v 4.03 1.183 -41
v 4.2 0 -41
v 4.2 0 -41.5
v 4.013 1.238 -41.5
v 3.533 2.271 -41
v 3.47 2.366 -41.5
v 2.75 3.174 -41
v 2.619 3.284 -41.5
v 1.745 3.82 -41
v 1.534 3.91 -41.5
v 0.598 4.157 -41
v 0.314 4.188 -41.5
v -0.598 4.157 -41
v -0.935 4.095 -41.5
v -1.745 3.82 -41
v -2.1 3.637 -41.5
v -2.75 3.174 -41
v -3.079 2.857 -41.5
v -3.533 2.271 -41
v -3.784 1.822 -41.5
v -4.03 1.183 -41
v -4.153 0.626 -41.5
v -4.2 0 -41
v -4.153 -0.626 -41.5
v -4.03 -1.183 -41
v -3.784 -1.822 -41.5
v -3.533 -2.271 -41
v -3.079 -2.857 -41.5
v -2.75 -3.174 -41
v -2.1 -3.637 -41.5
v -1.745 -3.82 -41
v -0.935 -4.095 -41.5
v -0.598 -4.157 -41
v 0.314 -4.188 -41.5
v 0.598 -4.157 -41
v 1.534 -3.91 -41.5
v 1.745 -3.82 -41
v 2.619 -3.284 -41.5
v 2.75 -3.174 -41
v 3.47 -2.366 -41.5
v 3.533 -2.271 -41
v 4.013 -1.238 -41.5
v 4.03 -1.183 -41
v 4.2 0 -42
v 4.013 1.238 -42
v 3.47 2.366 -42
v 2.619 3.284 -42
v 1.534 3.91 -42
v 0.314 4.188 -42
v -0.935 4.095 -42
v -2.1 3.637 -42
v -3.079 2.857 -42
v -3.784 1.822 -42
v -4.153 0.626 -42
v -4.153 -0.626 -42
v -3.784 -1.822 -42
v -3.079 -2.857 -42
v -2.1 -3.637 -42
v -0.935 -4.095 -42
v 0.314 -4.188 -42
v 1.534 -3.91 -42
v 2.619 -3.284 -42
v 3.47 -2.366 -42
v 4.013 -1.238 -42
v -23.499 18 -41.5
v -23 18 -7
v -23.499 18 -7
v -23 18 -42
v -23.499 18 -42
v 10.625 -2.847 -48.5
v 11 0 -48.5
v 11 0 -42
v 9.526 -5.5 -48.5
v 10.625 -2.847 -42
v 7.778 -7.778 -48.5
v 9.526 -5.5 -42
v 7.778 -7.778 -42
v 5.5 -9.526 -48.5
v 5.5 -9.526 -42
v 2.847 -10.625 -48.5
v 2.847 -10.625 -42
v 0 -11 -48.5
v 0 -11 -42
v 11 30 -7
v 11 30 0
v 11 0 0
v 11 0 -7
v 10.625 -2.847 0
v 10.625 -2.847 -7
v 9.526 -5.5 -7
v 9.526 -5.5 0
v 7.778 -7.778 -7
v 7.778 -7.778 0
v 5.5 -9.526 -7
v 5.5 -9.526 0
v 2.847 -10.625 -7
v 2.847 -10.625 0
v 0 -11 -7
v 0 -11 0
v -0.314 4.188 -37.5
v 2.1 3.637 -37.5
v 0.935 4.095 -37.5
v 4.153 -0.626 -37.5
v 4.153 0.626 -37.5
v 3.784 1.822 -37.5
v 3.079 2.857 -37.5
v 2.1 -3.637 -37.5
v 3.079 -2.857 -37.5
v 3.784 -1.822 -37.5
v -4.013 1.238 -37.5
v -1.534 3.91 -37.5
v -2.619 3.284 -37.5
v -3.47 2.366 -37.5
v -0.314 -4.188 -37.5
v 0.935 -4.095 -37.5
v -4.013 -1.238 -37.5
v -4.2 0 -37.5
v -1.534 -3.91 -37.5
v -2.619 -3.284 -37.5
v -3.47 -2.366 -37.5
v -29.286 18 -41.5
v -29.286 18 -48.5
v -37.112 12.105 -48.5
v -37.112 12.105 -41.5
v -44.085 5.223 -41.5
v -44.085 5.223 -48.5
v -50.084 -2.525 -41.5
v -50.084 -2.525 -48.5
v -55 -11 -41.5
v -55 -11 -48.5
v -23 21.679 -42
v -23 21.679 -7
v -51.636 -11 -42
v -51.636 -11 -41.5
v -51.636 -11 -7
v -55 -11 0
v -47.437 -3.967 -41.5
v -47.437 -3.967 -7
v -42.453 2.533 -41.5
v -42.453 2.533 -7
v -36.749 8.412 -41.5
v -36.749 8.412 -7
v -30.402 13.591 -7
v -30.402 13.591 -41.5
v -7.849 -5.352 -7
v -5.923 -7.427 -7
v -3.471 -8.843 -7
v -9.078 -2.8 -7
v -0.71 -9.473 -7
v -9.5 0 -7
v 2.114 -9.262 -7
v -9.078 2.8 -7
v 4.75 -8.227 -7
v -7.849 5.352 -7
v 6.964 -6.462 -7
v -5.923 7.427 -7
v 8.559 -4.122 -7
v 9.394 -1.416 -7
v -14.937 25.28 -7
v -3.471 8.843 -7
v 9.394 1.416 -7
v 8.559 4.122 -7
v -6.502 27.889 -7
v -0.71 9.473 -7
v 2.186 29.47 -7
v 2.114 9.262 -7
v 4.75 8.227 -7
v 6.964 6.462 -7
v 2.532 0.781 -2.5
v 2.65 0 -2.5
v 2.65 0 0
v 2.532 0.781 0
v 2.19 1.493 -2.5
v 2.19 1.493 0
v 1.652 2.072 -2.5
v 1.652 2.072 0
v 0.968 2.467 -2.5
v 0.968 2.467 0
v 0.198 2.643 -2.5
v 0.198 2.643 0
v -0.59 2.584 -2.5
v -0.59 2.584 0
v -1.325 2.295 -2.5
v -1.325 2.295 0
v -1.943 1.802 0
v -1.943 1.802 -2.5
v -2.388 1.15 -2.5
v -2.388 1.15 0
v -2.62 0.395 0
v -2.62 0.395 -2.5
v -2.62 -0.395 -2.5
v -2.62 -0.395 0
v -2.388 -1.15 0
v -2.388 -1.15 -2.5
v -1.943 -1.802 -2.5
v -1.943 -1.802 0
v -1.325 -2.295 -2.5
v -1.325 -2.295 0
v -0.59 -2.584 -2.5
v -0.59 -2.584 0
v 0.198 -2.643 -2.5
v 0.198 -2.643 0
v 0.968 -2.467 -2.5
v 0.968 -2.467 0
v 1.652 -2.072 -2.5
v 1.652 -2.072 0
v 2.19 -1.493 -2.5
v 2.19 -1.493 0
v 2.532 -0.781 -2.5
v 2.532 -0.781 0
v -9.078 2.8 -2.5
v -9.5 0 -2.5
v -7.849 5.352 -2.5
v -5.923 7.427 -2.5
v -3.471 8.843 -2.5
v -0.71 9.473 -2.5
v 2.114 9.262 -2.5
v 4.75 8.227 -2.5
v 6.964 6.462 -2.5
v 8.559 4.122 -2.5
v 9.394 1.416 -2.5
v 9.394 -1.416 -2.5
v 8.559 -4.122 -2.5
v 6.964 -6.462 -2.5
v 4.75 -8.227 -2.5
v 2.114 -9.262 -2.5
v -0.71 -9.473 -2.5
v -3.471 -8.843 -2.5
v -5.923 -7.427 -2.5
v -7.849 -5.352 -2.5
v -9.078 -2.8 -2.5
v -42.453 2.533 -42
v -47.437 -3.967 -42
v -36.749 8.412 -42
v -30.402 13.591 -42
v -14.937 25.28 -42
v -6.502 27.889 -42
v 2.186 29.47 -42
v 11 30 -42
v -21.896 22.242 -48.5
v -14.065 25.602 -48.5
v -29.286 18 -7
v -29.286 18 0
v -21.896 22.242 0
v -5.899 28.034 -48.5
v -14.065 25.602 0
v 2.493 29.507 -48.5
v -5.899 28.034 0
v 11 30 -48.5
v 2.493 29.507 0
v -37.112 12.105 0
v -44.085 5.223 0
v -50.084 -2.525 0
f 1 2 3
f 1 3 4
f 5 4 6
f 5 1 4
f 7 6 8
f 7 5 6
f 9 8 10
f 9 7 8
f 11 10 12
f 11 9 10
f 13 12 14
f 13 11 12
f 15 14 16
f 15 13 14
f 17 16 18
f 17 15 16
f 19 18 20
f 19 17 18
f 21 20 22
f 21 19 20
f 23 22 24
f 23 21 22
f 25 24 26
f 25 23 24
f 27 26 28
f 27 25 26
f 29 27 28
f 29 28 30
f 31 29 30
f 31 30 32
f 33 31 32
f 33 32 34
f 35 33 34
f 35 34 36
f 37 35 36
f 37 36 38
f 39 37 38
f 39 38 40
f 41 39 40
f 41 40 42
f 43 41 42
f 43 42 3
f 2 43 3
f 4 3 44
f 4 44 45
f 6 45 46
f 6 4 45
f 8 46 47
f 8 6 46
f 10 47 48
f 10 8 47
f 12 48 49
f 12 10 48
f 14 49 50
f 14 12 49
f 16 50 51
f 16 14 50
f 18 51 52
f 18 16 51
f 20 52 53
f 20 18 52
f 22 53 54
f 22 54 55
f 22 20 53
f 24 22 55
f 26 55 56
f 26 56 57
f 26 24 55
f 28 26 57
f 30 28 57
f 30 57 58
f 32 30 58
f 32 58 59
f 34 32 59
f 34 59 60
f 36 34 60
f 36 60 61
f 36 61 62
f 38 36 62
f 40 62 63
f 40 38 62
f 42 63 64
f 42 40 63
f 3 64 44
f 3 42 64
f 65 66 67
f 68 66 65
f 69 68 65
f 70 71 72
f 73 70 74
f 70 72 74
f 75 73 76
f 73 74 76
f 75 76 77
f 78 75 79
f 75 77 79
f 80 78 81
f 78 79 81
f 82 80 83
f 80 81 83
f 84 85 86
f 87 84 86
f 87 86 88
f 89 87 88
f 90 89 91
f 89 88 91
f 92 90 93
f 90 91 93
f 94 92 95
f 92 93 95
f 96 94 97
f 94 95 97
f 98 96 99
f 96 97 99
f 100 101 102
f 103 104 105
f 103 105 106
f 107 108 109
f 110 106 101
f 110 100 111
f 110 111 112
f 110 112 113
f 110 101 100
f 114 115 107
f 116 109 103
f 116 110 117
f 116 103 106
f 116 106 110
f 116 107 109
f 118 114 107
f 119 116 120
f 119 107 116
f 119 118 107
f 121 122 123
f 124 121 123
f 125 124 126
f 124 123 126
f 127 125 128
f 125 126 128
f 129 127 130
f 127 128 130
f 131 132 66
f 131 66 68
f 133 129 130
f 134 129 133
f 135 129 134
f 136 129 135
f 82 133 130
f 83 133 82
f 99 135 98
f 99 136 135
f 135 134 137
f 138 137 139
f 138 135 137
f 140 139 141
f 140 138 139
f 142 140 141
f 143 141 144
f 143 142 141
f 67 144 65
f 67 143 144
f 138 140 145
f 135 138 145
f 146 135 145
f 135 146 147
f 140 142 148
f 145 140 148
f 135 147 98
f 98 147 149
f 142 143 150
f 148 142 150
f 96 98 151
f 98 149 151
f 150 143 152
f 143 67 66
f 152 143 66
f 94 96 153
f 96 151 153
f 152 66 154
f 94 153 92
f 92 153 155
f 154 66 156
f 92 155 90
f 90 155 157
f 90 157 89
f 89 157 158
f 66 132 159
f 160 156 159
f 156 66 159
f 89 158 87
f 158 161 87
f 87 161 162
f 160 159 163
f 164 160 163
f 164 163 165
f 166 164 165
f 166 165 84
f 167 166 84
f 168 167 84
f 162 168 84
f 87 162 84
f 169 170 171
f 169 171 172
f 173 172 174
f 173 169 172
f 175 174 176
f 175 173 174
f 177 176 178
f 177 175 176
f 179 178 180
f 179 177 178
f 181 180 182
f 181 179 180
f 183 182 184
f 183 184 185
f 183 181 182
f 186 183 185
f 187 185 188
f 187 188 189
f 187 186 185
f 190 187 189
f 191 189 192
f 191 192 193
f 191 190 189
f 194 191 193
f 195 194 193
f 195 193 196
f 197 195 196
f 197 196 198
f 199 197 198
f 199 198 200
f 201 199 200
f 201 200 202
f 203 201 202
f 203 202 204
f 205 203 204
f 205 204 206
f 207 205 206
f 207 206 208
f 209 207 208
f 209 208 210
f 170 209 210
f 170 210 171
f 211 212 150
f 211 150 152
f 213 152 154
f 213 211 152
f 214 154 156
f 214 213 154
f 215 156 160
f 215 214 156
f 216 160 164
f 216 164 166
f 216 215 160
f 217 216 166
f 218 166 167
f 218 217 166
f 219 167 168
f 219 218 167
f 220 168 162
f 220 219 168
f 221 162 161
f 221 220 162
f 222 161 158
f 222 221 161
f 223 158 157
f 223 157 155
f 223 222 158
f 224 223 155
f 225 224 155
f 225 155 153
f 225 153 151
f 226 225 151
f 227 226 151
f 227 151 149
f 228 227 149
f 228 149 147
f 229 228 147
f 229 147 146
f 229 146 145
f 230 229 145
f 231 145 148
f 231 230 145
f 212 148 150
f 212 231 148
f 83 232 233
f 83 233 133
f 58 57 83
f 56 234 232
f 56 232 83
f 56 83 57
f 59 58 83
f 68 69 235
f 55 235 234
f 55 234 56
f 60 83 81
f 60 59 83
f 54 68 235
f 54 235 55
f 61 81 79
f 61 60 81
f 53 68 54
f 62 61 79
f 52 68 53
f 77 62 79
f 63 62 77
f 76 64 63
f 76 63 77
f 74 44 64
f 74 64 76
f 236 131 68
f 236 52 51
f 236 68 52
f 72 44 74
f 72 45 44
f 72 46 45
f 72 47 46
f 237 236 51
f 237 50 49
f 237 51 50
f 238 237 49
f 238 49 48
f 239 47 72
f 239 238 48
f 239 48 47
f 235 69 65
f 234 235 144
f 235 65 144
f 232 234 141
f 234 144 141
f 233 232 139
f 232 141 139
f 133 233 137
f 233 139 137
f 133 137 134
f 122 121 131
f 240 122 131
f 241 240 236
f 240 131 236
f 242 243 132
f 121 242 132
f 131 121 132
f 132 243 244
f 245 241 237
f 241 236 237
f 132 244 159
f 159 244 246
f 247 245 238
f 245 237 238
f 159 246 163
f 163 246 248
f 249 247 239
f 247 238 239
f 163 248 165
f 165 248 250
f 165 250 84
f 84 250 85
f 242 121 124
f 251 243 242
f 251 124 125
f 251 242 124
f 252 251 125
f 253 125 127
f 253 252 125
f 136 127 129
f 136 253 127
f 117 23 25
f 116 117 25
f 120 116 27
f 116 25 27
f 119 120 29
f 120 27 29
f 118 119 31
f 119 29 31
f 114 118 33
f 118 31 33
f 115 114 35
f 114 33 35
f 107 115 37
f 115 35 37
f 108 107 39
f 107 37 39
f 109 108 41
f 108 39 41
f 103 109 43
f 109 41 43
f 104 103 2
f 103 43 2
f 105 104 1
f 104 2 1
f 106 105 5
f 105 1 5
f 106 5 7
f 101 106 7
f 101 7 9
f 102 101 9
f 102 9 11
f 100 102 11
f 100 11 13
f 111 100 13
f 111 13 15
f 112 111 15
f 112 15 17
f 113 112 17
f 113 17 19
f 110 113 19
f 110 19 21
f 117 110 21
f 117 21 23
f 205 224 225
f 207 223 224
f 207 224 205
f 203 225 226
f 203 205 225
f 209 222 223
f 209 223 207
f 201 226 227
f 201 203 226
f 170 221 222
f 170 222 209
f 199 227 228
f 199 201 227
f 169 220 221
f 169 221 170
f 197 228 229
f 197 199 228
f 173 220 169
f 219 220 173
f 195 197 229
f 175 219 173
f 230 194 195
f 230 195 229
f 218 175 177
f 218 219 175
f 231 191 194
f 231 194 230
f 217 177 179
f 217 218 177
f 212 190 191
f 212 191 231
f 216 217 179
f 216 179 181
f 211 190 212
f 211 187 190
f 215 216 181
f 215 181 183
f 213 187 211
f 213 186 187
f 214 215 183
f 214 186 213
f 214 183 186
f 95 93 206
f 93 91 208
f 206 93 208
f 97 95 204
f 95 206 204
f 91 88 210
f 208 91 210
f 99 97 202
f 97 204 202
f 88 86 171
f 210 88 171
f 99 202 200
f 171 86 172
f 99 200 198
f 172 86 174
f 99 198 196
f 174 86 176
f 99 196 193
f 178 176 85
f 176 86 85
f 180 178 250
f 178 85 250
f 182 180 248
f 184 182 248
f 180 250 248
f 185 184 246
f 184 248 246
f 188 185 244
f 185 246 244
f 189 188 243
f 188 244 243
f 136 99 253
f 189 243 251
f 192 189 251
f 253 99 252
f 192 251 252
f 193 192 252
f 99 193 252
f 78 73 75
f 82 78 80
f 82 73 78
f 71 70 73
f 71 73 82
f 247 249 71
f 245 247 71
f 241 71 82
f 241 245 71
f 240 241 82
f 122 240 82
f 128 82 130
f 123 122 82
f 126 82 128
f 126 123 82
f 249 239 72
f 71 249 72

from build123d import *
from build123d.topology import SkipClean

# Parameters (mm, degrees)
SKETCH1_R              = 9.5
BOSS_EXTRUDE1_DEPTH    = 48
SKETCH2_W              = 34
SKETCH2_H              = 30
CUT_EXTRUDE1_DEPTH     = 62.481704596
BOSS_EXTRUDE2_START    = -2.5
SKETCH3_R              = 9.5
SKETCH3_R_2            = 2.4
BOSS_EXTRUDE2_DEPTH    = 2.5
SKETCH4_R              = 9.5
SKETCH4_R_2            = 4.2
BOSS_EXTRUDE3_DEPTH    = 7
SKETCH5_R              = 4.2
BOSS_EXTRUDE4_DEPTH    = 11
BOSS_EXTRUDE5_DEPTH    = 48
CUT_EXTRUDE2_START     = -48
CUT_EXTRUDE2_OUTLINE_R = 2.65
CUT_EXTRUDE2_DEPTH     = 48
CUT_EXTRUDE3_START     = -4.5
SKETCH8_R              = 9.5
CUT_EXTRUDE3_DEPTH     = 4.5
SKETCH9_R              = 6.067807638
CUT_EXTRUDE4_DEPTH     = 4.5
SKETCH10_R             = 9.5
BOSS_EXTRUDE6_DEPTH    = 4.5
SKETCH11_R             = 4.2
BOSS_EXTRUDE7_DEPTH    = 3.5
SKETCH12_R             = 2.4
BOSS_EXTRUDE8_DEPTH    = 2.5
SKETCH13_W             = 35
SKETCH13_H             = 34
CUT_EXTRUDE5_DEPTH     = 14.5
SKETCH15_R             = 3.436413098
BOSS_EXTRUDE9_DEPTH    = 10
BOSS_EXTRUDE10_DEPTH   = 0.5
SKETCH18_R             = 4.2
CUT_EXTRUDE8_DEPTH     = 0.5
CUT_EXTRUDE9_DEPTH     = 69.529190861
BOSS_EXTRUDE11_DEPTH   = 7
CUT_EXTRUDE10_DEPTH    = 80.22909819
BOSS_EXTRUDE12_DEPTH   = 41.5
SKETCH25_R             = 4.2
CUT_EXTRUDE11_DEPTH    = 0.5


# Read off the part's stored shape, not the designer's step: Cut-Extrude2
with BuildPart() as part:
    # Sketch1 → Boss-Extrude1 (new body)
    with BuildSketch(Plane.XY):
        with BuildLine():
            Line((-12, 0), (-12, 30))
            Line((-12, 30), (12, 30))
            Line((12, 30), (12, 0))
            ThreePointArc((12, 0), (0, -12), (-12, 0))
        make_face()
        Circle(SKETCH1_R, mode=Mode.SUBTRACT)
    extrude(amount=-BOSS_EXTRUDE1_DEPTH)

    # Sketch2 → Cut-Extrude1 (cut, through all)
    with BuildSketch(Plane.ZY.offset(12)):
        with Locations((-24, 3)):
            Rectangle(SKETCH2_W, SKETCH2_H)
    extrude(amount=-CUT_EXTRUDE1_DEPTH, mode=Mode.SUBTRACT)

    # Sketch3 → Boss-Extrude2 (add)
    with BuildSketch(Plane(origin=(0, 0, -48), x_dir=(-1, 0, 0), z_dir=(0, 0, -1)).offset(BOSS_EXTRUDE2_START)):
        Circle(SKETCH3_R)
        Circle(SKETCH3_R_2, mode=Mode.SUBTRACT)
    extrude(amount=BOSS_EXTRUDE2_DEPTH)

    # Sketch4 → Boss-Extrude3 (add)
    with BuildSketch(Plane.XY):
        with Locations(Location((0, 0, 0), (0, 0, 180))):
            Circle(SKETCH4_R)
        Circle(SKETCH4_R_2, mode=Mode.SUBTRACT)
    extrude(amount=-BOSS_EXTRUDE3_DEPTH)

    # Sketch5 → Boss-Extrude4 (add)
    with BuildSketch(Plane.XY):
        Circle(SKETCH5_R)
    extrude(amount=-BOSS_EXTRUDE4_DEPTH)

    # Sketch6 → Boss-Extrude5 (add)
    with BuildSketch(Plane(origin=(0, 0, -48), x_dir=(-1, 0, 0), z_dir=(0, 0, -1))):
        Polygon((12, 30), (12, 18), (18, 18), (38, 18), (38, 30), align=None)
    extrude(amount=-BOSS_EXTRUDE5_DEPTH)

    # Cut-Extrude2 outline → Cut-Extrude2 (cut)
    with BuildSketch(Plane.XY.offset(CUT_EXTRUDE2_START)):
        Circle(CUT_EXTRUDE2_OUTLINE_R)
    extrude(amount=CUT_EXTRUDE2_DEPTH, mode=Mode.SUBTRACT)

    # Sketch8 → Cut-Extrude3 (cut)
    with BuildSketch(Plane(origin=(0, 0, -7), x_dir=(-1, 0, 0), z_dir=(0, 0, -1)).offset(CUT_EXTRUDE3_START)):
        Circle(SKETCH8_R)
    extrude(amount=CUT_EXTRUDE3_DEPTH, mode=Mode.SUBTRACT)


with BuildPart() as cut_extrude3_piece_1:
    # of the separate pieces the step leaves, piece 1, a body of its own (cut_extrude3_pieces)
    add(part.part.solids().sort_by_distance((-12, 0, 0))[0])

    # Sketch10 → Boss-Extrude6 (add)
    with BuildSketch(Plane.XY.offset(-45.5)):
        with Locations(Location((0, 0, 0), (0, 0, 90))):
            Circle(SKETCH10_R)
    extrude(amount=BOSS_EXTRUDE6_DEPTH)

    # Sketch11 → Boss-Extrude7 (add)
    with BuildSketch(Plane.XY.offset(-41)):
        with Locations(Location((0, 0, 0), (0, 0, 180))):
            Circle(SKETCH11_R)
    extrude(amount=BOSS_EXTRUDE7_DEPTH)

    # Sketch12 → Boss-Extrude8 (add)
    with BuildSketch(Plane(origin=(0, 0, -48), x_dir=(-1, 0, 0), z_dir=(0, 0, -1))):
        Circle(SKETCH12_R)
    extrude(amount=-BOSS_EXTRUDE8_DEPTH)

    # Sketch13 → Cut-Extrude5 (cut)
    with BuildSketch(Plane(origin=(0, 30, 0), x_dir=(1, 0, 0), z_dir=(0, 1, 0))):
        with Locations((-5.5, 24)):
            Rectangle(SKETCH13_W, SKETCH13_H)
    extrude(amount=-CUT_EXTRUDE5_DEPTH, mode=Mode.SUBTRACT)

    # Sketch15 → Boss-Extrude9 (add)
    with BuildSketch(Plane(origin=(0, 0, -48), x_dir=(-1, 0, 0), z_dir=(0, 0, -1))):
        Circle(SKETCH15_R)
    extrude(amount=-BOSS_EXTRUDE9_DEPTH)

    # Sketch16 → Boss-Extrude10 (add)
    with SkipClean():  # the faces are left unmerged after this step: merging them gives an invalid solid
        with BuildSketch(Plane(origin=(0, 0, -48), x_dir=(-1, 0, 0), z_dir=(0, 0, -1))):
            Polygon((38, 30), (-12, 30), (-12, 18), (12, 18), (38, 18), align=None)
            with BuildLine():
                Line((-12, 0), (12, 0))
                ThreePointArc((12, 0), (0, -12), (-12, 0))
            make_face()
            with BuildLine():
                ThreePointArc((12, 0), (0, 12), (-12, 0))
                Line((-12, 0), (12, 0))
            make_face()
            with BuildLine():
                Line((12, 0), (-12, 0))
                ThreePointArc((-12, 0), (0, -12), (12, 0))
            make_face()
            with BuildLine():
                Line((12, 18), (-12, 18))
                Line((-12, 18), (-12, 0))
                ThreePointArc((-12, 0), (0, 12), (12, 0))
                Line((12, 0), (12, 18))
            make_face()
        extrude(amount=BOSS_EXTRUDE10_DEPTH)

    # Sketch18 → Cut-Extrude8 (cut)
    with SkipClean():  # the faces are left unmerged after this step: merging them gives an invalid solid
        with BuildSketch(Plane.XY.offset(-41)):
            with BuildLine():
                Line((12, 30), (-23, 30))
                Line((-23, 30), (-23, 18))
                Line((-23, 18), (-12, 18))
                Line((-12, 18), (-12, 0))
                ThreePointArc((-12, 0), (0, -12), (12, 0))
                Line((12, 0), (12, 30))
            make_face()
            Circle(SKETCH18_R, mode=Mode.SUBTRACT)
        extrude(amount=-CUT_EXTRUDE8_DEPTH, mode=Mode.SUBTRACT)

    # Sketch19 → Cut-Extrude9 (cut, through all)
    with SkipClean():  # the faces are left unmerged after this step: merging them gives an invalid solid
        with BuildSketch(Plane.XY):
            with BuildLine():
                ThreePointArc((11, 0), (0, -11), (-11, 0))
                Line((-11, 0), (-12, 0))
                ThreePointArc((-12, 0), (0, -12), (12, 0))
                Line((12, 0), (12, 30))
                Line((12, 30), (11, 30))
                Line((11, 30), (11, 0))
            make_face()
        extrude(amount=-CUT_EXTRUDE9_DEPTH, mode=Mode.SUBTRACT)

    # Sketch21 → Boss-Extrude11 (add)
    with SkipClean():  # the faces are left unmerged after this step: merging them gives an invalid solid
        with BuildSketch(Plane.XY):
            with BuildLine():
                Line((-55, -11), (0, -11))
                ThreePointArc((0, -11), (-7.778174593, -7.778174593), (-11, 0))
                Line((-11, 0), (-12, 0))
                Line((-12, 0), (-12, 18))
                Line((-12, 18), (-29.285566016, 18))
                ThreePointArc((-29.285566016, 18), (-44.085437149, 5.222560402), (-55, -11))
            make_face()
        boss_extrude11 = extrude(amount=-BOSS_EXTRUDE11_DEPTH)

    # Mirror2: Boss-Extrude11 across plane
    with SkipClean():  # the faces are left unmerged after this step: merging them gives an invalid solid
        add(boss_extrude11.mirror(Plane.XY.offset(-24.25)))

    # Sketch23 → Cut-Extrude10 (cut, through all)
    with SkipClean():  # the faces are left unmerged after this step: merging them gives an invalid solid
        with BuildSketch(Plane.XY):
            with BuildLine():
                Line((11, 30), (-38, 30))
                Line((-38, 30), (-38, 11.325220695))
                ThreePointArc((-38, 11.325220695), (-15.219016868, 25.173069355), (11, 30))
            make_face()
        extrude(amount=-CUT_EXTRUDE10_DEPTH, mode=Mode.SUBTRACT)

    # Sketch24 → Boss-Extrude12 (add)
    with SkipClean():  # the faces are left unmerged after this step: merging them gives an invalid solid
        with BuildSketch(Plane.XY):
            with BuildLine():
                ThreePointArc((-23, 21.6788275), (-41.60205739, 7.887419381), (-55, -11))
                Line((-55, -11), (-51.635998377, -11))
                ThreePointArc((-51.635998377, -11), (-39.486754135, 5.75970176), (-23, 18.276837089))
                Line((-23, 18.276837089), (-23, 21.6788275))
            make_face()
        extrude(amount=-BOSS_EXTRUDE12_DEPTH)

    # Sketch25 → Cut-Extrude11 (cut)
    # profile 1 of 3: a face of its own
    with BuildSketch(Plane.XY.offset(-41.5)):
        with BuildLine():
            ThreePointArc((11, 27), (-6.550595226, 24.784456384), (-23, 18.276837089))
            Line((-23, 18.276837089), (-23, 18))
            Line((-23, 18), (-23.499204657, 18))
            ThreePointArc((-23.499204657, 18), (-39.685914386, 5.555259732), (-51.635998377, -11))
            Line((-51.635998377, -11), (0, -11))
            ThreePointArc((0, -11), (-7.778174593, 7.778174593), (11, 0))
            Line((11, 0), (11, 27))
        make_face()
    # profile 2 of 3: a face of its own
    with BuildSketch(Plane.XY.offset(-41.5)):
        with BuildLine():
            ThreePointArc((0, -11), (7.778174593, -7.778174593), (11, 0))
            ThreePointArc((11, 0), (-7.778174593, 7.778174593), (0, -11))
        make_face()
        Circle(SKETCH25_R, mode=Mode.SUBTRACT)
    # profile 3 of 3: a face of its own
    with BuildSketch(Plane.XY.offset(-41.5)):
        with BuildLine():
            ThreePointArc((11, 30), (-6.501727856, 27.889455027), (-23, 21.6788275))
            Line((-23, 21.6788275), (-23, 18.276837089))
            ThreePointArc((-23, 18.276837089), (-6.550595226, 24.784456384), (11, 27))
            Line((11, 27), (11, 30))
        make_face()
    extrude(amount=-CUT_EXTRUDE11_DEPTH, mode=Mode.SUBTRACT)


with BuildPart() as cut_extrude3_piece_2:
    # of the separate pieces the step leaves, piece 2, a body of its own (cut_extrude3_pieces)
    add(part.part.solids().sort_by_distance((4.2, 0, -7))[0])

    # Sketch9 → Cut-Extrude4 (cut)
    with BuildSketch(Plane(origin=(0, 0, -11), x_dir=(-1, 0, 0), z_dir=(0, 0, -1))):
        Circle(SKETCH9_R)
    extrude(amount=-CUT_EXTRUDE4_DEPTH, mode=Mode.SUBTRACT)


solid = cut_extrude3_piece_1.part
